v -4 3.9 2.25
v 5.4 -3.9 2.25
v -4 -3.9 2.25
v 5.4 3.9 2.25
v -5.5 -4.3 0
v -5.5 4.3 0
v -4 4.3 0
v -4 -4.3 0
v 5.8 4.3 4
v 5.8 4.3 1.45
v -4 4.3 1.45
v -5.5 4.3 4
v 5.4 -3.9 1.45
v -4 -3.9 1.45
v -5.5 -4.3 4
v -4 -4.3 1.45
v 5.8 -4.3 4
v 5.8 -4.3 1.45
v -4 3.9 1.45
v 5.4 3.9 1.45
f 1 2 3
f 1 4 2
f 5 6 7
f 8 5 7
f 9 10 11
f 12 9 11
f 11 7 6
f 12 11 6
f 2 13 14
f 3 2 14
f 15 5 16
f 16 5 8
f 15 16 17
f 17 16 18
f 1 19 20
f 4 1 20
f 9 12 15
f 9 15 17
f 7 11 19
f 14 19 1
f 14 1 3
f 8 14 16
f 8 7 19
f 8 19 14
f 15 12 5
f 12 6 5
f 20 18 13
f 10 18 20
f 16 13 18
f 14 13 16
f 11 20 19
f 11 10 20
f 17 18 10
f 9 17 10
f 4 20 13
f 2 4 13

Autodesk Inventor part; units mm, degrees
ref_plane "YZ Plane" through (0, 0, 0) normal (1, 0, 0) x (0, 1, 0)
ref_plane "XZ Plane" through (0, 0, 0) normal (0, 1, 0) x (-1, 0, 0)
ref_plane "XY Plane" through (0, 0, 0) normal (0, 0, 1) x (1, 0, 0)
sketch "Sketch1" plane through (0, 0, 0) normal (0, 0, 1) x (1, 0, 0)
  line L0 (0, 0) -> (5.8, 0) construction
  line L1 (5.8, 0) -> (5.8, 4.3) construction
  line L2 (5.8, 4.3) -> (0, 4.3) construction
  line L3 (0, 4.3) -> (0, 0) construction
  line L4 (5.8, 4.3) -> (-5.5, 4.3)
  line L5 (-5.5, 4.3) -> (-5.5, -4.3)
  line L6 (-5.5, -4.3) -> (5.8, -4.3)
  line L7 (5.8, -4.3) -> (5.8, 4.3)
  dimension "d0" = 5.8
  dimension "d1" = 4.3
  dimension "d2" = 11.3
  dimension "d3" = 8.6
extrude "Extrusion1" add sketch "Sketch1" along normal blind 4
sketch "Sketch2" plane through (0, 0, 0) normal (0, 0, -1) x (-1, 0, 0)
  line L0 (-5.8, 4.3) -> (5.5, 4.3) projected
  line L1 (5.5, -4.3) -> (4, -4.3) construction
  line L2 (4, -4.3) -> (4, 4.3) construction
  line L3 (4, 4.3) -> (5.5, 4.3) construction
  line L4 (5.5, 4.3) -> (5.5, -4.3) construction
  line L5 (4, -4.3) -> (-5.8, -4.3)
  line L6 (-5.8, -4.3) -> (-5.8, 4.3)
  line L7 (-5.8, 4.3) -> (4, 4.3)
  line L8 (4, 4.3) -> (4, -4.3)
  point P0 (0, 0)
  dimension "d6" = 1.5
extrude "Extrusion2" cut sketch "Sketch2" against normal blind 1.45
sketch "Sketch3" plane through (0, 0, 1.45) normal (0, 0, -1) x (-1, 0, 0)
  line L0 (4, -4.3) -> (4, 4.3) projected
  line L1 (-5.8, -4.3) -> (-5.4, -4.3) construction
  line L2 (-5.4, -4.3) -> (-5.4, -3.9) construction
  line L3 (-5.4, -3.9) -> (-5.8, -3.9) construction
  line L4 (-5.8, -3.9) -> (-5.8, -4.3) construction
  line L5 (-5.8, 4.3) -> (-5.4, 4.3) construction
  line L6 (-5.4, 4.3) -> (-5.4, 3.9) construction
  line L7 (-5.4, 3.9) -> (-5.8, 3.9) construction
  line L8 (-5.8, 3.9) -> (-5.8, 4.3) construction
  line L9 (-5.4, -3.9) -> (4, -3.9)
  line L10 (4, -3.9) -> (4, 3.9)
  line L11 (4, 3.9) -> (-5.4, 3.9)
  line L12 (-5.4, 3.9) -> (-5.4, -3.9)
  point P0 (0, 0)
  dimension "d9" = 0.4
  dimension "d10" = 0.4
  dimension "d11" = 0.4
  dimension "d12" = 0.4
extrude "Extrusion3" cut sketch "Sketch3" against normal blind 0.8
properties part number "lid_f"
